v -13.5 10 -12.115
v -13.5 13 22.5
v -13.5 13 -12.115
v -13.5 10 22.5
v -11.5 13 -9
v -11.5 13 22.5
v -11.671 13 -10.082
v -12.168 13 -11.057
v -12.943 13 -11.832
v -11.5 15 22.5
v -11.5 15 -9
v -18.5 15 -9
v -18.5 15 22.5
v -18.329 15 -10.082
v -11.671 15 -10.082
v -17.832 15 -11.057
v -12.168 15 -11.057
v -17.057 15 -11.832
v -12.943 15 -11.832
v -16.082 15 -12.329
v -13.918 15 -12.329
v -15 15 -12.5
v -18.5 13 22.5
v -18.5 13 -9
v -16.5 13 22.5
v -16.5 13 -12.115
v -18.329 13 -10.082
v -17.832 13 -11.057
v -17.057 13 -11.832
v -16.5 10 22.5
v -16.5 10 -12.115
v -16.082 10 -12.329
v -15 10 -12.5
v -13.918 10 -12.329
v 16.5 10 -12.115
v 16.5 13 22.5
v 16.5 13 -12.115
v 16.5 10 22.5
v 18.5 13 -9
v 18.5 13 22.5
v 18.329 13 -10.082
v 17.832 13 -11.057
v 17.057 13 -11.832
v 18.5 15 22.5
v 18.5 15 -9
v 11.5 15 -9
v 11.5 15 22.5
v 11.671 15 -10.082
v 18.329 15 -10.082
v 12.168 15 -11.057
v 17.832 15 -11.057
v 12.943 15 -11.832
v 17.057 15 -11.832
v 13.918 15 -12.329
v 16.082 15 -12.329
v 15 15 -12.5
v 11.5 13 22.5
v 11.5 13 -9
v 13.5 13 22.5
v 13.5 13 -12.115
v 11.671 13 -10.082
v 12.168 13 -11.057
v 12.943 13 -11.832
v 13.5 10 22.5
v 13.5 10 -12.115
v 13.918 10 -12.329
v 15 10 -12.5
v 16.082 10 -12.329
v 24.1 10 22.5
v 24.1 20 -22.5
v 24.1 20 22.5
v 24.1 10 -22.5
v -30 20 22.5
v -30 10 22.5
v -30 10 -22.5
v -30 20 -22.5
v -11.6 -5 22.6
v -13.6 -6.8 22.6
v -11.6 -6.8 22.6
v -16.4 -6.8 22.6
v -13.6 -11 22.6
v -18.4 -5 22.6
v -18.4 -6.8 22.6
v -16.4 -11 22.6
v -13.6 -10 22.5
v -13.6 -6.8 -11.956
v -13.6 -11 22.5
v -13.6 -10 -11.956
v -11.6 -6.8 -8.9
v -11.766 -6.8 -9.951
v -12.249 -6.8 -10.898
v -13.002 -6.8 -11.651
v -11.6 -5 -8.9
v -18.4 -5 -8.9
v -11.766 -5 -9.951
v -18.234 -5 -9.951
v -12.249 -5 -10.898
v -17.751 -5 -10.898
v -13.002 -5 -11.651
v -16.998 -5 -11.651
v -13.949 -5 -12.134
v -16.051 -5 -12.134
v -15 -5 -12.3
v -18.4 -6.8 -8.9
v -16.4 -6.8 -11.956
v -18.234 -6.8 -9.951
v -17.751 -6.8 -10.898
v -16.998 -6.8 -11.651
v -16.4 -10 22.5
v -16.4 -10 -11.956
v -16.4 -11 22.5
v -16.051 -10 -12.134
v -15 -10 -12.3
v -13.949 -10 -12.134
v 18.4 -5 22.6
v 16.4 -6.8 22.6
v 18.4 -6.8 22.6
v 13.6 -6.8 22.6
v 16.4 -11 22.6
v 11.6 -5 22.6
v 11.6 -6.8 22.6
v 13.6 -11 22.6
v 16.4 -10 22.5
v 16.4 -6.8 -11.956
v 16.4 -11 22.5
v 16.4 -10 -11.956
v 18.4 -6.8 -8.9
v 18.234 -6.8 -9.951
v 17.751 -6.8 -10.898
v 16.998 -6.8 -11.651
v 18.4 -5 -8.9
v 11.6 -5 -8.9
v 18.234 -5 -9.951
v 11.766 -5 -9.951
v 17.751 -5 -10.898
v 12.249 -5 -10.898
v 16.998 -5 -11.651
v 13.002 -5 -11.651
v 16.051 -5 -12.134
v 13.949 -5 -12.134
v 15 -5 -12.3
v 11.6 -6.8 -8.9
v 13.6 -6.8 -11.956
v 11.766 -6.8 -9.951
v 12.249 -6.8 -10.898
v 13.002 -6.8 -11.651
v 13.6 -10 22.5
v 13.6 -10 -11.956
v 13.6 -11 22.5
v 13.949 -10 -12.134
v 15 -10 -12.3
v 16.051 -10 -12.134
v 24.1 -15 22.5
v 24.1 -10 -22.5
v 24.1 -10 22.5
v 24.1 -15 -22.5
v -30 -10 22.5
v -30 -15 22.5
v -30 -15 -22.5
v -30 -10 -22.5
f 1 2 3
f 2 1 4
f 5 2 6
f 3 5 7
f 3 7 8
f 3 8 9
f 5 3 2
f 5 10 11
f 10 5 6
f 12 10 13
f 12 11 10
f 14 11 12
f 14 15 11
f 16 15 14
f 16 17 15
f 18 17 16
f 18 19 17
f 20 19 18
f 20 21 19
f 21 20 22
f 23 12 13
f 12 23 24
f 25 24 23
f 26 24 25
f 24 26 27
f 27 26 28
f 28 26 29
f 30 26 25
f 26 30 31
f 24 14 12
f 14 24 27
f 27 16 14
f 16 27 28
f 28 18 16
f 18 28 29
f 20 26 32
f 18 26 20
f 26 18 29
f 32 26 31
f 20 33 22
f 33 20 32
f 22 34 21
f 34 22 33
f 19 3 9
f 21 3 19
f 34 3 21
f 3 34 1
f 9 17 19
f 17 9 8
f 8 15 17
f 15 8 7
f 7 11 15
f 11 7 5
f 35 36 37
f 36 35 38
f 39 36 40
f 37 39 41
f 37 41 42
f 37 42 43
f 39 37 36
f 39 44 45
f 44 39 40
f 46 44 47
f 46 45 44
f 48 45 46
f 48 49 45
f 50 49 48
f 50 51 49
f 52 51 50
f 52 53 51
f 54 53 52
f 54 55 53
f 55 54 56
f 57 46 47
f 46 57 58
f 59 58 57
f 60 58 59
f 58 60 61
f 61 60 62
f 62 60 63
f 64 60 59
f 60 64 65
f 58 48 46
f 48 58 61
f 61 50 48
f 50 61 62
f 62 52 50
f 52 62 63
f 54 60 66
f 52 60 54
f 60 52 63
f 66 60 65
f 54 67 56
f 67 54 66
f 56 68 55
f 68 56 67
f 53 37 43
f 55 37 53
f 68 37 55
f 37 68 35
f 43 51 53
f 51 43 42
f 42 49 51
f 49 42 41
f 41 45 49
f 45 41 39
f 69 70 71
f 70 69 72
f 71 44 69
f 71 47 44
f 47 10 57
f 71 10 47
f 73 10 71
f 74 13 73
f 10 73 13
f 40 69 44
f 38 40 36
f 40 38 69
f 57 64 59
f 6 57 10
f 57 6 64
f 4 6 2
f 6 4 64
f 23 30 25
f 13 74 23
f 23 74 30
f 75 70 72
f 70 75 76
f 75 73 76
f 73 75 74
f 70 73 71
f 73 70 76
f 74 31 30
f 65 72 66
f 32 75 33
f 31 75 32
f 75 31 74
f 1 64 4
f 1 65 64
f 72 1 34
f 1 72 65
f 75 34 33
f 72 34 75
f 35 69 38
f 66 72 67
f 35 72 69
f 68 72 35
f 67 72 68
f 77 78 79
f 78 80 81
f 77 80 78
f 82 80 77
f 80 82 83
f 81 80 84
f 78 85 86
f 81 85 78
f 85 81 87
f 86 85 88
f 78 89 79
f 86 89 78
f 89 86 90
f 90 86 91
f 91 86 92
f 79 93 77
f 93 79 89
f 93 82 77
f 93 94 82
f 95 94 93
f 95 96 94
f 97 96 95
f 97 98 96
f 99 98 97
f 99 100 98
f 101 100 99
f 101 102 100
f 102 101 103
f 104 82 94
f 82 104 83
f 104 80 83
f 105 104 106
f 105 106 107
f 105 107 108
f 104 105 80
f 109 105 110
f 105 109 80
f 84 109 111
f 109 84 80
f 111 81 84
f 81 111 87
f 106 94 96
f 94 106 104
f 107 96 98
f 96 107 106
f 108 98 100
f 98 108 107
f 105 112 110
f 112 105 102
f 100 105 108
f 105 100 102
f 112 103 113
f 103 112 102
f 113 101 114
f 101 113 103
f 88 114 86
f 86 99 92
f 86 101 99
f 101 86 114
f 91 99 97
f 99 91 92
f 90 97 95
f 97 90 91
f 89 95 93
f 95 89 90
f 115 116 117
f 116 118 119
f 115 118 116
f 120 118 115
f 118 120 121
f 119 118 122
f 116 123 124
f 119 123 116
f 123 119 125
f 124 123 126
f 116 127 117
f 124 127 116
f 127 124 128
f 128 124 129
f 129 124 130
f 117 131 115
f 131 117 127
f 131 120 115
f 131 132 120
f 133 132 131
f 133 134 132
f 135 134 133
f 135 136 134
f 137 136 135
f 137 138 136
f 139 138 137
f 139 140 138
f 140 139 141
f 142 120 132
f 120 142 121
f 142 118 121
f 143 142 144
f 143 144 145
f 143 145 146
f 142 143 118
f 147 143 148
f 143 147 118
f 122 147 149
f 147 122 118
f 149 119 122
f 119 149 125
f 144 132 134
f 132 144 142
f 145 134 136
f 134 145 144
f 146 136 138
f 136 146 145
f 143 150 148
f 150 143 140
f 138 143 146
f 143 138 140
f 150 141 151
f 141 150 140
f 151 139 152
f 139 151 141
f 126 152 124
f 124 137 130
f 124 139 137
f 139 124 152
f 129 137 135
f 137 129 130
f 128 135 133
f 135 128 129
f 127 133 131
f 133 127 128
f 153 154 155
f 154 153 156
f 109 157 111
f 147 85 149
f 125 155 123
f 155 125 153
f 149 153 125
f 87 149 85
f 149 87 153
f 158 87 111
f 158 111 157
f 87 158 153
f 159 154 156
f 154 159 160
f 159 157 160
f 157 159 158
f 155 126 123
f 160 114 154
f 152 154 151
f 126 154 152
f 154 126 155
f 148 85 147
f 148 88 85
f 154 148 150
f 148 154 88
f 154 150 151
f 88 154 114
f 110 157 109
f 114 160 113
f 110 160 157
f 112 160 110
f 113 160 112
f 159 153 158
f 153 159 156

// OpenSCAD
// file: fixing.scad
// See fixing.png for guidance

rounding_mm = 2; // r
height_mm = 45;
beam_width_mm = 40; // BW
beam_rounding_mm = 3; // Br
outer_beam_rounding_mm = 8; // OBr
thickness_mm = 10; // T
assert(thickness_mm>2*rounding_mm, "thickness_mm is too small");
overlap_width_mm = 4.1; // OW; 3 was too small for minkowski, 4 was too small too
assert(overlap_width_mm>2*rounding_mm, "overlap_width_mm is too small");
overlap_length_mm = 4; // OL
assert(overlap_length_mm>rounding_mm, "overlap_length_mm is too small");
hole_diam_mm = 6; // HD
hole_pos_mm = 24; // HP
countersink_diam_mm = 14; // CsW
countersink_depth_mm = 4; // CsS
notch_pos_mm = 5;
notch_height_mm = height_mm-10;
notch_entry_width_mm = 3; // EW
notch_entry_depth_mm = 3; // ED
notch_corner_width_mm = 2; // EW'
notch_corner_depth_mm = 2; // ED'

rail_play_mm = 0.1;

module rail(play_mm=rail_play_mm, height_offset_mm=0) {
    actual_height_mm = notch_height_mm + height_offset_mm - play_mm;
    actual_entry_width_mm = notch_entry_width_mm - 2*play_mm;
    actual_entry_depth_mm = notch_entry_depth_mm + 2*play_mm;
    actual_corner_width_mm = notch_corner_width_mm;
    actual_corner_depth_mm = notch_corner_depth_mm - 2*play_mm;
    entry_overflow_mm = 1;

    translate([0,0,height_mm-actual_height_mm+play_mm])
    difference() {
        linear_extrude(actual_height_mm)
        union() {
            translate([-actual_entry_width_mm/2, -entry_overflow_mm])
                square([actual_entry_width_mm, actual_entry_depth_mm+entry_overflow_mm]);
            translate([-actual_entry_width_mm/2-actual_corner_width_mm, actual_entry_depth_mm])
                square([actual_entry_width_mm+2*actual_corner_width_mm, actual_corner_depth_mm]);
        }

        // bottom rounding
        d = actual_entry_width_mm+2*actual_corner_width_mm;
        translate([0, -1, d/2])
        rotate([-90,0,0])
        linear_extrude(actual_entry_depth_mm+actual_corner_depth_mm+2)
        difference() {
            translate([-d/2-1,0]) square([d+2, d/2+1]);
            circle(d=d);
        }
    }
}

module rails_x2(along="x", play_mm=rail_play_mm, height_offset_mm=0, center=true) {
    rotation = along=="x"?0:along=="y"?90:undef;
    rotate([0,0,rotation]) translate([center?-thickness_mm-beam_width_mm/2:0,0,center?-height_mm/2:0]) {
        translate([thickness_mm+notch_pos_mm, 0, 0]) rotate([0,0,-2*rotation]) rail(play_mm, height_offset_mm);
        translate([thickness_mm+beam_width_mm-notch_pos_mm, 0, 0]) rotate([0,0,-2*rotation]) rail(play_mm, height_offset_mm);
    }
}

module notch() {
    rail(play_mm=0, height_offset_mm=1);
}

module notches_x2(along="x", center=false) {
    rails_x2(along=along, play_mm=0, height_offset_mm=1, center=center);
}

module fixing(with_notches=true) {
    // "kernel" measures = measures before rounding (minkowski)
    kernel_height_mm = height_mm-2*rounding_mm;
    kernel_thickness_mm = thickness_mm-2*rounding_mm; // kT
    kernel_beam_rounding_mm = beam_rounding_mm+rounding_mm; // kBr
    kernel_outer_beam_rounding_mm = outer_beam_rounding_mm-rounding_mm; // kOBr

    difference() {
        translate([rounding_mm, rounding_mm, rounding_mm])
        minkowski() {
            $fn = 20; // no need for many facets here
            linear_extrude(kernel_height_mm)
            union() {
                difference() {
                    square(beam_width_mm+kernel_thickness_mm+overlap_width_mm);
                    translate([kernel_thickness_mm, kernel_thickness_mm])
                        square(beam_width_mm+2*rounding_mm);
                    translate([kernel_thickness_mm+overlap_length_mm, kernel_thickness_mm+overlap_length_mm])
                        square(beam_width_mm+1);
                    difference() {
                        square(kernel_outer_beam_rounding_mm);
                        translate([kernel_outer_beam_rounding_mm, kernel_outer_beam_rounding_mm])
                            circle($fn=20, r=kernel_outer_beam_rounding_mm);
                    }
                }
                translate([kernel_thickness_mm, kernel_thickness_mm]) difference() {
                    square(kernel_beam_rounding_mm);
                    translate([kernel_beam_rounding_mm, kernel_beam_rounding_mm])
                        circle($fn=20, r=kernel_beam_rounding_mm);
                }
            }
            sphere(r=rounding_mm);
        }
        translate([thickness_mm+hole_pos_mm, -1, height_mm/2]) rotate([-90,0,0]) {
            cylinder($fn=60, h=thickness_mm+2, d=hole_diam_mm);
            cylinder($fn=60, h=countersink_depth_mm+1, d=countersink_diam_mm);
        }
        translate([-1, thickness_mm+hole_pos_mm, height_mm/2]) rotate([0,90,0]) {
            cylinder($fn=60, h=thickness_mm+2, d=hole_diam_mm);
            cylinder($fn=60, h=countersink_depth_mm+1, d=countersink_diam_mm);
        }
        if (with_notches) {
            notches_x2("x");
            notches_x2("y");
        }
    }
}

fixing(true);

// Tests

module rails_test() {
    test_width_mm = beam_width_mm+overlap_width_mm+thickness_mm;
    union() {
        $fn = 20;
        translate([-beam_width_mm/2-thickness_mm, -thickness_mm/2, -height_mm/2]) cube([test_width_mm, thickness_mm/2, height_mm]);
        rails_x2("x", center=true);
    }
}

module notches_test() {
    test_width_mm = beam_width_mm+overlap_width_mm+thickness_mm;
    difference() {
        $fn = 20;
        translate([-beam_width_mm/2-thickness_mm, 0, -height_mm/2]) cube([test_width_mm, thickness_mm, height_mm]);
        translate([0, 0, 1]) notches_x2("x", center=true);
    }
}

module all_tests() {
    translate([0, thickness_mm]) notches_test();
    translate([0, -thickness_mm]) rails_test();
}

module visual_test() {
    color("green") notches_test();
    color("red") translate([0,-rail_play_mm,0]) rails_test();
}
// main file
use <fixing.scad>

all_tests();

// Uncomment to check visually that the play is correctly taken into account
// !visual_test();
